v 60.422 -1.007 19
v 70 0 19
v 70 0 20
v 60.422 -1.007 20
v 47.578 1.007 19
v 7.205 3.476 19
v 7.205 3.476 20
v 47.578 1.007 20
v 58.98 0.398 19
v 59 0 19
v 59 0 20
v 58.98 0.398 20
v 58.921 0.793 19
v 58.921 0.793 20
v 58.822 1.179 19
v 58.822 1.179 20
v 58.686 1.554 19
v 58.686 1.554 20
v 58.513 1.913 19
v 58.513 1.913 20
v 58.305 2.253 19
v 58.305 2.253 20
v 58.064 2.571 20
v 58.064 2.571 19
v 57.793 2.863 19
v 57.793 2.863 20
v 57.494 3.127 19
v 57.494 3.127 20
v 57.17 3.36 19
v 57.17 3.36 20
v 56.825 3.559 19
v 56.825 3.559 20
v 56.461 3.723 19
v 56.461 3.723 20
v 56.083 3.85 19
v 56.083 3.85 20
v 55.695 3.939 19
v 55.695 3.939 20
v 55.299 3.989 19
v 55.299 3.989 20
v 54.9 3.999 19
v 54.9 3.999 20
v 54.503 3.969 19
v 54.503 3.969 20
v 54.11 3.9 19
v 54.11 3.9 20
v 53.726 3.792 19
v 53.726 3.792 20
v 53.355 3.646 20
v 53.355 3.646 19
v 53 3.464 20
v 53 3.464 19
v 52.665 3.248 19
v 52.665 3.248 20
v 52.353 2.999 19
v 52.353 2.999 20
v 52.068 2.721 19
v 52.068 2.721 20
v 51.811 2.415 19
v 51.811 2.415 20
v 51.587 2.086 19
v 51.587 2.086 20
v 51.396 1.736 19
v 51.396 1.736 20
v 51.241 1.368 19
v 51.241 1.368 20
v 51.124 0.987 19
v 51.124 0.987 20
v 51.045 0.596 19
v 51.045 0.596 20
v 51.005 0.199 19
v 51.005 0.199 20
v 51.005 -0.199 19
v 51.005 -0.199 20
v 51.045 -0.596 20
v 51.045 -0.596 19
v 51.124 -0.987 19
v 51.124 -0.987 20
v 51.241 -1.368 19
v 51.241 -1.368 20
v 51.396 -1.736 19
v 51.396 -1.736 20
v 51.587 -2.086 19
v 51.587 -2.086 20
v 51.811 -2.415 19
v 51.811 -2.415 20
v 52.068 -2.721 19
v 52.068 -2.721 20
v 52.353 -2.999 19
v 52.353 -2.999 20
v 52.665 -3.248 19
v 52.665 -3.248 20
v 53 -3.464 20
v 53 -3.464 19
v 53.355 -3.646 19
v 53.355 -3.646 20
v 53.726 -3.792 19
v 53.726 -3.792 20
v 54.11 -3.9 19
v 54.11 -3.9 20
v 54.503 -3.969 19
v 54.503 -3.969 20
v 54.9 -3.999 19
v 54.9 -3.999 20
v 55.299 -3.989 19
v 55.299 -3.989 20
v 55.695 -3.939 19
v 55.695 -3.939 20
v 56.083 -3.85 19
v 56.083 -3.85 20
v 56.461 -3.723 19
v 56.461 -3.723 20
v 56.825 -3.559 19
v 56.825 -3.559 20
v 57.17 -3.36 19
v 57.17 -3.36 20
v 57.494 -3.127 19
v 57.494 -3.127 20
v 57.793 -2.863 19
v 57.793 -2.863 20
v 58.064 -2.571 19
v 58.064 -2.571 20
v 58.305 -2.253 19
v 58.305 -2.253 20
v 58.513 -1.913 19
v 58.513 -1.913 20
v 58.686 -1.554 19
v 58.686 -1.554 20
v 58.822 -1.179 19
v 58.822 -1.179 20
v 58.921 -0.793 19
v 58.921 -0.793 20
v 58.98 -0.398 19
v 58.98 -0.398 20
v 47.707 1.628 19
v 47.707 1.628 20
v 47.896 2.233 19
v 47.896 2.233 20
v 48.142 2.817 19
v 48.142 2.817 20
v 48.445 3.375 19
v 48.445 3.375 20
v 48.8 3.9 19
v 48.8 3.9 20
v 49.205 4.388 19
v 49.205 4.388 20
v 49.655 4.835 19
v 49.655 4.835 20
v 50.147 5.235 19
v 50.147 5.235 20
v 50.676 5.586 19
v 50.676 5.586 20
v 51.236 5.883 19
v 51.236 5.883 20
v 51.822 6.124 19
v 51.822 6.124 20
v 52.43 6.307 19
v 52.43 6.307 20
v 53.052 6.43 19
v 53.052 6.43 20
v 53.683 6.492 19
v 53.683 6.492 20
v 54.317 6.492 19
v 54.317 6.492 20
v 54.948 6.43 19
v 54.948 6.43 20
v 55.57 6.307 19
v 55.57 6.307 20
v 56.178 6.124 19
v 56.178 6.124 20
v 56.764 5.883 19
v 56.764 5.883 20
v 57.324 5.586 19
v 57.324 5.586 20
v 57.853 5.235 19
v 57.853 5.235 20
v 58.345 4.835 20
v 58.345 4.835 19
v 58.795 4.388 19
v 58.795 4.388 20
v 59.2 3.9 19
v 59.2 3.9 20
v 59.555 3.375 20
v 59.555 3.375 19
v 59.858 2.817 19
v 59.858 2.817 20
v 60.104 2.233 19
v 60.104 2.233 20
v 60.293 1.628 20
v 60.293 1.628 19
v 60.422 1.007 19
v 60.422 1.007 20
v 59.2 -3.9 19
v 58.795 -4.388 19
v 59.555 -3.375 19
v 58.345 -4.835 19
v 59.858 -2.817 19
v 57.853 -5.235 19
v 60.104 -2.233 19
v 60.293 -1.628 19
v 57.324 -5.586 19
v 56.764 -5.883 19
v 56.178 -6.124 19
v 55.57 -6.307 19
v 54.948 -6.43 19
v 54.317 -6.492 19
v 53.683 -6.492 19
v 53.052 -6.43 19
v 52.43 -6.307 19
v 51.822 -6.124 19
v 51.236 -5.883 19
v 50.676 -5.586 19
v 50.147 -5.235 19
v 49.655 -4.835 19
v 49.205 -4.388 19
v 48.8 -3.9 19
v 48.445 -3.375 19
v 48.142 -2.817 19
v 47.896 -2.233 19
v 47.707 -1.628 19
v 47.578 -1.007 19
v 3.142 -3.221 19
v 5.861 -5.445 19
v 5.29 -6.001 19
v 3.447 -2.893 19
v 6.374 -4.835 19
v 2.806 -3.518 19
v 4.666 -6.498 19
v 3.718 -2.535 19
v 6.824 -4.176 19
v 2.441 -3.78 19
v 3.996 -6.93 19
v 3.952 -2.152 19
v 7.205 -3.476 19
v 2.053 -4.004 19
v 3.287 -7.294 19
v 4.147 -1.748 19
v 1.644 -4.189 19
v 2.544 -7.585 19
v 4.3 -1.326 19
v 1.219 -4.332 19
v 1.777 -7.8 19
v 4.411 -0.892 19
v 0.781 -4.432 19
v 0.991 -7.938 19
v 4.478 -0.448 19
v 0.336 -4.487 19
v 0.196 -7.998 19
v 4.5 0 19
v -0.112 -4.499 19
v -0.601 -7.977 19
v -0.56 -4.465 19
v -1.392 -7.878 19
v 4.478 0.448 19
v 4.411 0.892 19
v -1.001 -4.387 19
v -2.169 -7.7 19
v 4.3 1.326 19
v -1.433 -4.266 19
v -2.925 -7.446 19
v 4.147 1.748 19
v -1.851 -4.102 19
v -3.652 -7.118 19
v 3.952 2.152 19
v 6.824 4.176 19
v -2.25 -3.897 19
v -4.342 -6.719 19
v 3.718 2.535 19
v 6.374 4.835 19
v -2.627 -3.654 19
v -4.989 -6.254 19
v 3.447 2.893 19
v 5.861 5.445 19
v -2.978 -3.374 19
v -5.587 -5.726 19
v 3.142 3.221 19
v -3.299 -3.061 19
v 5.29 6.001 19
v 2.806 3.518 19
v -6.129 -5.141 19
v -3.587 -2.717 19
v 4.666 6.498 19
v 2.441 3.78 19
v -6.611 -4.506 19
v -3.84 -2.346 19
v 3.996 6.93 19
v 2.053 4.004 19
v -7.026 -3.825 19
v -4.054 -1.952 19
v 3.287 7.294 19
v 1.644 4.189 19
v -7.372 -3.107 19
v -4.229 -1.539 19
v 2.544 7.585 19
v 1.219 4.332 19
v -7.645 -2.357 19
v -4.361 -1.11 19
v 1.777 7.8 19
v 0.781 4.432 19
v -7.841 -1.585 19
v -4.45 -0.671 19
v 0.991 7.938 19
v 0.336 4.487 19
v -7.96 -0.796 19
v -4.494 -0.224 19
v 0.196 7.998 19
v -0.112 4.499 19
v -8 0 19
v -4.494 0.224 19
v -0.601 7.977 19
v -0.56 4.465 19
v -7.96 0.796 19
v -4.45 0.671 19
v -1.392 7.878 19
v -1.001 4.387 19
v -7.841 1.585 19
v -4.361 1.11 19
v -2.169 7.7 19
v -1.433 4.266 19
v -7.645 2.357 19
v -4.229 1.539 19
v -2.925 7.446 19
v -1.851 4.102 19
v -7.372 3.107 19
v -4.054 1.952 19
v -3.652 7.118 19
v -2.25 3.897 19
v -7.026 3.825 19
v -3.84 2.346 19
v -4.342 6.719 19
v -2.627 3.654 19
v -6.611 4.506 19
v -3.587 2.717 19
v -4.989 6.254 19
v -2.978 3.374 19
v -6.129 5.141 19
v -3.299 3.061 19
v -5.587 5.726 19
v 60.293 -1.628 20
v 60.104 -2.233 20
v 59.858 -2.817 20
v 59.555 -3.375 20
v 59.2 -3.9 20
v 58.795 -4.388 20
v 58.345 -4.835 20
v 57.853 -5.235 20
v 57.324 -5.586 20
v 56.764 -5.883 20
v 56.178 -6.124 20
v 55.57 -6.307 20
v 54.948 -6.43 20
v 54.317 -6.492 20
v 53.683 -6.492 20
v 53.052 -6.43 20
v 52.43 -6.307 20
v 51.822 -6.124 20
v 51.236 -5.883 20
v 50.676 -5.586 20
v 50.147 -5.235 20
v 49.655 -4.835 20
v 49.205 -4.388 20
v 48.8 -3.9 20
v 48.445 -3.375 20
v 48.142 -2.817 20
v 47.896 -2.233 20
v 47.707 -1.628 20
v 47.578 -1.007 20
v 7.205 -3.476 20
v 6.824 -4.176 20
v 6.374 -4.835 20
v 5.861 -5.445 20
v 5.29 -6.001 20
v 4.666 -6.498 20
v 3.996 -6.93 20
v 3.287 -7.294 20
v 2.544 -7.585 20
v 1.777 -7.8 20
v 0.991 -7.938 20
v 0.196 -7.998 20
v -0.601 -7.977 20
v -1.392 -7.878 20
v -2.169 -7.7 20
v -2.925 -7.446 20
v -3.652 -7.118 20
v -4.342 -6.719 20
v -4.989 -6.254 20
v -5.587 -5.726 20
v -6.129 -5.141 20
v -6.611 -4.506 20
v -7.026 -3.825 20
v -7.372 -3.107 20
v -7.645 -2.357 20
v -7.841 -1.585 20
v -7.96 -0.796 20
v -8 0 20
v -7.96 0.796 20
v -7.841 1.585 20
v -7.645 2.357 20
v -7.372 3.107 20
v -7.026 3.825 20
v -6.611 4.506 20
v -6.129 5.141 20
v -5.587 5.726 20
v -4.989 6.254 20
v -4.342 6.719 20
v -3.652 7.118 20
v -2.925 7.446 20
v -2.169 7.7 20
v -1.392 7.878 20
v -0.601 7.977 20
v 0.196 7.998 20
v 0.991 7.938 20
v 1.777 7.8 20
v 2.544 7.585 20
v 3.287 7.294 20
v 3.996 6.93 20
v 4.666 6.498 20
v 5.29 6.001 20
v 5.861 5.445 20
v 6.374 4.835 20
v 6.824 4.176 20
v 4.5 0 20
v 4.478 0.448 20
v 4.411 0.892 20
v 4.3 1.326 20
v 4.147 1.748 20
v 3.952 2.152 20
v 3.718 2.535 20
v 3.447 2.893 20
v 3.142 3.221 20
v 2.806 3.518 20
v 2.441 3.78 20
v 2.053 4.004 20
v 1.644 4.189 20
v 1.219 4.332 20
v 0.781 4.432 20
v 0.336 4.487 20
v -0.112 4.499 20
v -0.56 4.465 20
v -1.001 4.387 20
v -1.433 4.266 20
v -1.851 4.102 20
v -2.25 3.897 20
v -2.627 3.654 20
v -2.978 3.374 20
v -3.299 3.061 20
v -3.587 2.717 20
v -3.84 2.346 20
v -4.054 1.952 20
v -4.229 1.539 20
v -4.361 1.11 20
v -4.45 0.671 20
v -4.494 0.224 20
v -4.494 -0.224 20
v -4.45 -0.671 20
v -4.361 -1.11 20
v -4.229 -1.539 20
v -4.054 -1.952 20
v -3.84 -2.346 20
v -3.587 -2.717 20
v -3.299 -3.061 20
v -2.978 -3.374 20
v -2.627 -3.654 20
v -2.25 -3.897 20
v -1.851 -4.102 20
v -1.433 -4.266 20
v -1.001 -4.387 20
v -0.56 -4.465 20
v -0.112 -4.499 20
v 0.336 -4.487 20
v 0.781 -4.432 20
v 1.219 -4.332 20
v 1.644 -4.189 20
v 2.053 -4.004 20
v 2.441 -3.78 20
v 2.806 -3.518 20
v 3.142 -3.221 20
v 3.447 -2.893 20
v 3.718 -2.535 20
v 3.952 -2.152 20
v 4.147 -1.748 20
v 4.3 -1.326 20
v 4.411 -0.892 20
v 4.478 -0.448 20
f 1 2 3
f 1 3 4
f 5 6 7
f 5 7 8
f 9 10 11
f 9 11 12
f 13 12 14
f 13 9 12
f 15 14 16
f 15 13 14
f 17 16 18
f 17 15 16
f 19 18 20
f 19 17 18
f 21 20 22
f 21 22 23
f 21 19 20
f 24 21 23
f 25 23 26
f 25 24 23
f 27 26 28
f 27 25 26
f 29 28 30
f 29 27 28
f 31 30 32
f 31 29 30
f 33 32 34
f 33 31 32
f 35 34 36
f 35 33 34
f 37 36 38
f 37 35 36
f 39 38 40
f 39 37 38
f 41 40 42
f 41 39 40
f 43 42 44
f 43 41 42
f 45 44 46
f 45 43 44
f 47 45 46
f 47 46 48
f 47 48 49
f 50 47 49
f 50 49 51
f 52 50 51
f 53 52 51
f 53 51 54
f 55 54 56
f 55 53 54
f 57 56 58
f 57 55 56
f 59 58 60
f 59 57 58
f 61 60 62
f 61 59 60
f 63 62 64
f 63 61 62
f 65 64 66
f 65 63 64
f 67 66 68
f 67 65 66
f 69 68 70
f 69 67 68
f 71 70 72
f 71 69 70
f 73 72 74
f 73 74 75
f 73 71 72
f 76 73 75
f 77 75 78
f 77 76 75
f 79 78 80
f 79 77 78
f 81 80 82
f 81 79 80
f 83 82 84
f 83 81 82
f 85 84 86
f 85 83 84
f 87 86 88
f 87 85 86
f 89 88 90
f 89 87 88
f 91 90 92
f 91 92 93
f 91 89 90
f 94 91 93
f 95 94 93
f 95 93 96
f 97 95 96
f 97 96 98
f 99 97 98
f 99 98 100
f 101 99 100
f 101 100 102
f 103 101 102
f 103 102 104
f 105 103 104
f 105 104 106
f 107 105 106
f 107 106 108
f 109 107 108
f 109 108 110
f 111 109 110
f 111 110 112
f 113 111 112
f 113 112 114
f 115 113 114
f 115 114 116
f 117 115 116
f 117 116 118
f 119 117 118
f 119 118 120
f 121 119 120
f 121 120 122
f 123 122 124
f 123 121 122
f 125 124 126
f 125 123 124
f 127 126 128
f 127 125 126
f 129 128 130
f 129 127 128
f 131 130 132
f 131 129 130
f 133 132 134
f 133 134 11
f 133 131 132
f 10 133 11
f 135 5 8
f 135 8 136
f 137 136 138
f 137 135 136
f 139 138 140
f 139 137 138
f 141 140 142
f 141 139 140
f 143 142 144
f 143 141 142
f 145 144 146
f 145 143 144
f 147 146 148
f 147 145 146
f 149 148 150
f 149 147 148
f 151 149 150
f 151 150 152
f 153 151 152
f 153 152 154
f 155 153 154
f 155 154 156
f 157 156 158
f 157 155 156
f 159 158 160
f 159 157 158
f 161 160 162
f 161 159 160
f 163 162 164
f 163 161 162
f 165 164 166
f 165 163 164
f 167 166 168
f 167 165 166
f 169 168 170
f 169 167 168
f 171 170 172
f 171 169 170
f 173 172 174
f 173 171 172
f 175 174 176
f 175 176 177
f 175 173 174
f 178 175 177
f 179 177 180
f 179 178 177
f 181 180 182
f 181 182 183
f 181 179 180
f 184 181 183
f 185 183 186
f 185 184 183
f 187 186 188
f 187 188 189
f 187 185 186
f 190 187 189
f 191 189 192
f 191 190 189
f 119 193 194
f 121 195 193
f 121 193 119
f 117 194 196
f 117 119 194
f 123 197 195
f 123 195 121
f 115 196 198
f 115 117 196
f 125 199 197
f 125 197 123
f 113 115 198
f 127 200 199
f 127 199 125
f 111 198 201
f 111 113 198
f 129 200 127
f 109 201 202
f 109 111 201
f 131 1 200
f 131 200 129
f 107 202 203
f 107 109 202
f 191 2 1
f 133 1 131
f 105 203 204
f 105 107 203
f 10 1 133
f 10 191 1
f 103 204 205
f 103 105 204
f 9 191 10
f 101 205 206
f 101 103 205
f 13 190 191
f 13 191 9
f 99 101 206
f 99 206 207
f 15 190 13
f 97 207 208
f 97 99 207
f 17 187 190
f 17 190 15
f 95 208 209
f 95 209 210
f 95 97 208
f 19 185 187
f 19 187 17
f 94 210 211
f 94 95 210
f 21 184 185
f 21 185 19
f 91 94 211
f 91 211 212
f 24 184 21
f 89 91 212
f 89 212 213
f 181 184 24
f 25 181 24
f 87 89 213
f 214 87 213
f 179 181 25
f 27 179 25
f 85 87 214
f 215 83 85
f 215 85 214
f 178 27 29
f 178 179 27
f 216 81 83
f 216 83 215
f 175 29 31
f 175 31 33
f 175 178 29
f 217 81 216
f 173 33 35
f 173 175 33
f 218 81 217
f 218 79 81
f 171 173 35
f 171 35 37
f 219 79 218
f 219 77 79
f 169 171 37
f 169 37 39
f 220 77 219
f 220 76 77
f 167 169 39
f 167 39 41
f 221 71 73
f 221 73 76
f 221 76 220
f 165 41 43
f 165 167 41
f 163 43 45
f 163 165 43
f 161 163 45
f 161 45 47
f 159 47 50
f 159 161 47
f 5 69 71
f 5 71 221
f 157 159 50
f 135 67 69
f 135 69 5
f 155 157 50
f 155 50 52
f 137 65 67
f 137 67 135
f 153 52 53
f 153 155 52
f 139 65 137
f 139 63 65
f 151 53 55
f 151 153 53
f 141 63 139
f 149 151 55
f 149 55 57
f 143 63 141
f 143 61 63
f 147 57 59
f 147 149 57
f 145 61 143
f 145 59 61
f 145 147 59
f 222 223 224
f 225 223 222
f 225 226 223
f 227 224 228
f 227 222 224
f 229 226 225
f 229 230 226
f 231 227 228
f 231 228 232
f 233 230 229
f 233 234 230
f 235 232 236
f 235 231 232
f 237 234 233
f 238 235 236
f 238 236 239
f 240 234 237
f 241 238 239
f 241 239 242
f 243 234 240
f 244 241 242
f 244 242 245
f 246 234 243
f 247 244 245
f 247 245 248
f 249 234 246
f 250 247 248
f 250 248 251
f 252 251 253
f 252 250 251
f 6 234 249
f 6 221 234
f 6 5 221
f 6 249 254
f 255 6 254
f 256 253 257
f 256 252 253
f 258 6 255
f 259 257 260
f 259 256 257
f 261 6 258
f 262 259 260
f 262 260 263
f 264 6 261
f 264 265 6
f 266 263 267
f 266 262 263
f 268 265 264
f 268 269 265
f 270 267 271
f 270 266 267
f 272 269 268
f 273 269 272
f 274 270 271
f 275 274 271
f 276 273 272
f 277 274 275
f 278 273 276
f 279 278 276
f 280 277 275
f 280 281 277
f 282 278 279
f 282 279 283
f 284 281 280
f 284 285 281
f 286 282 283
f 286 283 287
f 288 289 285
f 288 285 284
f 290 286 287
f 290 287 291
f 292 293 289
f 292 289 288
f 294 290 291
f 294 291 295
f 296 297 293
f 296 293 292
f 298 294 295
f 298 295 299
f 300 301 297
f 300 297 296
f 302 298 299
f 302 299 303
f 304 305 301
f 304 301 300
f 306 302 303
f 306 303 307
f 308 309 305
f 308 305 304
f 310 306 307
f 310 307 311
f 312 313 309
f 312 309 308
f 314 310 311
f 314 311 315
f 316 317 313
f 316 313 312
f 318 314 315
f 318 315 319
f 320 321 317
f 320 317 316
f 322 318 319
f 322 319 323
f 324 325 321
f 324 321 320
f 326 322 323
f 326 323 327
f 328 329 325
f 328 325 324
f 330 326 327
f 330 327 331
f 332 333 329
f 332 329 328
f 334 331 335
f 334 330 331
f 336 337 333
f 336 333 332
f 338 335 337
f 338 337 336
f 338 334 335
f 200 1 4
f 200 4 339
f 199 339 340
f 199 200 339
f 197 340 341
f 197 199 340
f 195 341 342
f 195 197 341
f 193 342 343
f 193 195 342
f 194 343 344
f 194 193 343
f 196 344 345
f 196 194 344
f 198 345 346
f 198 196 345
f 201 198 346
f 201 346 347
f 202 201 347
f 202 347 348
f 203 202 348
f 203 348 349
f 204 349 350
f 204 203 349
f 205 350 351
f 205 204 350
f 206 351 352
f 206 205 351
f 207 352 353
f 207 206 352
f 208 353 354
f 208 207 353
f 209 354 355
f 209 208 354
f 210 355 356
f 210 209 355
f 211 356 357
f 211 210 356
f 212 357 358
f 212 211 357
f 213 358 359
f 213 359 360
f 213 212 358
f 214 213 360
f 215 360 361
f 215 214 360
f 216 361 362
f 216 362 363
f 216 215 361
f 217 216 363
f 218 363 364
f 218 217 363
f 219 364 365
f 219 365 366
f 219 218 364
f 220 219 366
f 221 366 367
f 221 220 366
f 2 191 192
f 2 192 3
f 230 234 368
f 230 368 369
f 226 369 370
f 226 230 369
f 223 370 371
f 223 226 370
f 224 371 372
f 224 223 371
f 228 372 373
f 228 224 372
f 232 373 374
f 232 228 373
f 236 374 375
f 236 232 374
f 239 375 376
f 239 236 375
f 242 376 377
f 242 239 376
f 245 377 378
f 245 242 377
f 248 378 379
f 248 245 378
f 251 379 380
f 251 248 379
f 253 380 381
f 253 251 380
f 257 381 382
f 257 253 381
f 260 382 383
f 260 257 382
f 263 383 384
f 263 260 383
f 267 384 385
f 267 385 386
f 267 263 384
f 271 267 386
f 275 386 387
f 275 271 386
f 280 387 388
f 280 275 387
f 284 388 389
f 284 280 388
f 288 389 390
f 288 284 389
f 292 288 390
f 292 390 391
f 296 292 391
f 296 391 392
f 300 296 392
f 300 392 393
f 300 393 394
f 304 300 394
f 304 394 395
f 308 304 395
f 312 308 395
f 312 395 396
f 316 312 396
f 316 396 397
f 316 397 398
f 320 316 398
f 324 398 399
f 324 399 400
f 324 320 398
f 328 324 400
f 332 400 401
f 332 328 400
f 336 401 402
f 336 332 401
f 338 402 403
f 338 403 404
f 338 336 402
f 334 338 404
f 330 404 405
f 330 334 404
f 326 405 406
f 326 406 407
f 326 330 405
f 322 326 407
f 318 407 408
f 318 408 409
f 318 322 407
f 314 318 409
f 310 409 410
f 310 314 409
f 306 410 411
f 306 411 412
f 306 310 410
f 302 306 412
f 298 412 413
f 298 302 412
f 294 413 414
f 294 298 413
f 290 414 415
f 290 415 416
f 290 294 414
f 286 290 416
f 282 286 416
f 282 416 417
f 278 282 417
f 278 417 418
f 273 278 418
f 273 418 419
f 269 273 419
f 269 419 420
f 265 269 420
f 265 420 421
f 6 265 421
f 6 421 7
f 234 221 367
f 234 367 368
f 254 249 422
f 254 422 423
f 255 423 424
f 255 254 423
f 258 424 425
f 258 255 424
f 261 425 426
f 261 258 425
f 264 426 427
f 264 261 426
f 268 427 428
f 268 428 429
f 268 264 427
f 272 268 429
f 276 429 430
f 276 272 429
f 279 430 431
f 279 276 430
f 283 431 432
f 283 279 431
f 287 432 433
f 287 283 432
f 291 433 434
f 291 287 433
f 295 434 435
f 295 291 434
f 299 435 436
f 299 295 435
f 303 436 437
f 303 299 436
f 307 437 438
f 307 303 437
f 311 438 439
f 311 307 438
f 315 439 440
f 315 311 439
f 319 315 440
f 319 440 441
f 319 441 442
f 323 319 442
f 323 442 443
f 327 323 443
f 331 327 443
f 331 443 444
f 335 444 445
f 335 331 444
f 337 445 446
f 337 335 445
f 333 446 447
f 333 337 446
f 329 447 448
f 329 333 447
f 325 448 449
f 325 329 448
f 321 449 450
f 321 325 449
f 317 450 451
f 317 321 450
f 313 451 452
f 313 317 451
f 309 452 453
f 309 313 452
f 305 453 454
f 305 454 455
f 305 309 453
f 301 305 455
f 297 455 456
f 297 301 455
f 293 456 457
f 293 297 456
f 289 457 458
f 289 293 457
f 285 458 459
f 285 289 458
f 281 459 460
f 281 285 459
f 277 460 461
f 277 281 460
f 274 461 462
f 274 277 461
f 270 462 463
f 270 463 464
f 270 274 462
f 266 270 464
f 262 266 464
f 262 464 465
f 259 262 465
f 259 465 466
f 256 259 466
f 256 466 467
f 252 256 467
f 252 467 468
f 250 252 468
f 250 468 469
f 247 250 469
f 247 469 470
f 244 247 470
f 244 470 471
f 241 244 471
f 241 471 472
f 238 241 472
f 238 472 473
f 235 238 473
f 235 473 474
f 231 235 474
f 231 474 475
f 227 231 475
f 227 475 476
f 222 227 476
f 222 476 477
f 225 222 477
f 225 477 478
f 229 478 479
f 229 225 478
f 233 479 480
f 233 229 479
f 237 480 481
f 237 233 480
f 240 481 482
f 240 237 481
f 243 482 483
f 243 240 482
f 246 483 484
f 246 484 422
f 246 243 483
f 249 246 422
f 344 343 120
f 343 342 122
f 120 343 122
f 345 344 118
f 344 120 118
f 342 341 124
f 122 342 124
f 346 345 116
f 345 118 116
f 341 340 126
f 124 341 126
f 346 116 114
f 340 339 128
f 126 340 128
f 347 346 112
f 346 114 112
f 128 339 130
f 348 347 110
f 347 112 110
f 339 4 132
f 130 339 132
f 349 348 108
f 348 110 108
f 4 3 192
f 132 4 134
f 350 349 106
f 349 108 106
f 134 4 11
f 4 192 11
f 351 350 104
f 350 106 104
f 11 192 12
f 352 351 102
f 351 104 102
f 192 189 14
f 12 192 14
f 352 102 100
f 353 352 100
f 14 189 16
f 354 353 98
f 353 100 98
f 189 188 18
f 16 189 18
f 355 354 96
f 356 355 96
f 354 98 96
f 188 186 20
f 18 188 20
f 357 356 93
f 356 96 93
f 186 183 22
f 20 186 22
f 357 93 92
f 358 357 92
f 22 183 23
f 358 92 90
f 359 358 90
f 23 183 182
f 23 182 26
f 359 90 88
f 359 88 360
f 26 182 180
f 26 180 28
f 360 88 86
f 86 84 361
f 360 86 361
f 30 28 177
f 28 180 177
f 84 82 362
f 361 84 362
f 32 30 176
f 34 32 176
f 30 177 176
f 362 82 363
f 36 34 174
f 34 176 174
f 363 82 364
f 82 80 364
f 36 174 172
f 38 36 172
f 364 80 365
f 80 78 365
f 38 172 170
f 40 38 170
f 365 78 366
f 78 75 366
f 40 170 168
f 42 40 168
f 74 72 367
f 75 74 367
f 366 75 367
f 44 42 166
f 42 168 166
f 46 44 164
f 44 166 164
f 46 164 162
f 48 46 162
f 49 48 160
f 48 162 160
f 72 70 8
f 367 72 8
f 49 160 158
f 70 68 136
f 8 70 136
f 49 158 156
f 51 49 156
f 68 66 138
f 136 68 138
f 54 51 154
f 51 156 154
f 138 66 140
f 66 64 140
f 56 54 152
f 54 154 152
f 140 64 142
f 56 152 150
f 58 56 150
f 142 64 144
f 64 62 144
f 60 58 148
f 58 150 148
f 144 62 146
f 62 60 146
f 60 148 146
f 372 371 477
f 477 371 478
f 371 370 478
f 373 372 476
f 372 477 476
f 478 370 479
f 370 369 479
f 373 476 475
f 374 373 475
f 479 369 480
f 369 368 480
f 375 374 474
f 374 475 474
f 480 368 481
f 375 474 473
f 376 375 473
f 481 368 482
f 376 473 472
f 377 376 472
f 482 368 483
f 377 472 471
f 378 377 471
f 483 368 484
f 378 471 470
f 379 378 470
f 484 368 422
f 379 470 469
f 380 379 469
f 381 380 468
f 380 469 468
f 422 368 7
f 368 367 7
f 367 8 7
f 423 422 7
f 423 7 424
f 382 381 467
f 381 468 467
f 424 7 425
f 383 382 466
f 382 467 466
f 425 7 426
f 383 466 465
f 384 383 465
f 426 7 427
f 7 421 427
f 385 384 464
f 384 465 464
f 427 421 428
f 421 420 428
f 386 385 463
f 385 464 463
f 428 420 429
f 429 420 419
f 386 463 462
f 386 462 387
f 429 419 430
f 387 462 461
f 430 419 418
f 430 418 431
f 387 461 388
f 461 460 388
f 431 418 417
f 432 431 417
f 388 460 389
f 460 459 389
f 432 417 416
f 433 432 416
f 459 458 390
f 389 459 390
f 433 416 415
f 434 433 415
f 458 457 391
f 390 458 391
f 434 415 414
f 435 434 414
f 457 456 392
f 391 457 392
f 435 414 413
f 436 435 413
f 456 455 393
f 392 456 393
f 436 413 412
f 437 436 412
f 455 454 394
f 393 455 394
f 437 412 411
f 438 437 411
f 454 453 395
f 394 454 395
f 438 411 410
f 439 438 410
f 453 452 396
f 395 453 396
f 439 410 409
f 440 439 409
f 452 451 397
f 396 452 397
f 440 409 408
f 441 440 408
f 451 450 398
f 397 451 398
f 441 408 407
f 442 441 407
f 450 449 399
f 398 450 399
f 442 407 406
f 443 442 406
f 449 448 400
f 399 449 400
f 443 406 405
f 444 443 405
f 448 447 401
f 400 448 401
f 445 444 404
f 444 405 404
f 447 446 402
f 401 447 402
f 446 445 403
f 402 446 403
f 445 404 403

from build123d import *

# Parameters (mm, degrees)
BOSS_EXTRUDE1_START = 19
SKETCH1_R           = 4
SKETCH1_R_2         = 4.5
BOSS_EXTRUDE1_DEPTH = 1


with BuildPart() as part:
    # Sketch1 → Boss-Extrude1 (new body)
    with BuildSketch(Plane.XY.offset(BOSS_EXTRUDE1_START)):
        with BuildLine():
            Line((60.421564163, 1.006734174), (70, 0))
            Line((70, 0), (60.421564163, -1.006734174))
            ThreePointArc((60.421564163, -1.006734174), (54, -6.5), (47.578435837, -1.006734174))
            Line((47.578435837, -1.006734174), (7.205346635, -3.476058093))
            ThreePointArc((7.205346635, -3.476058093), (-8, 0), (7.205346635, 3.476058093))
            Line((7.205346635, 3.476058093), (47.578435837, 1.006734174))
            ThreePointArc((47.578435837, 1.006734174), (54, 6.5), (60.421564163, 1.006734174))
        make_face()
        with Locations((55, 0)):
            Circle(SKETCH1_R, mode=Mode.SUBTRACT)
        Circle(SKETCH1_R_2, mode=Mode.SUBTRACT)
    extrude(amount=BOSS_EXTRUDE1_DEPTH)


solid = part.part
